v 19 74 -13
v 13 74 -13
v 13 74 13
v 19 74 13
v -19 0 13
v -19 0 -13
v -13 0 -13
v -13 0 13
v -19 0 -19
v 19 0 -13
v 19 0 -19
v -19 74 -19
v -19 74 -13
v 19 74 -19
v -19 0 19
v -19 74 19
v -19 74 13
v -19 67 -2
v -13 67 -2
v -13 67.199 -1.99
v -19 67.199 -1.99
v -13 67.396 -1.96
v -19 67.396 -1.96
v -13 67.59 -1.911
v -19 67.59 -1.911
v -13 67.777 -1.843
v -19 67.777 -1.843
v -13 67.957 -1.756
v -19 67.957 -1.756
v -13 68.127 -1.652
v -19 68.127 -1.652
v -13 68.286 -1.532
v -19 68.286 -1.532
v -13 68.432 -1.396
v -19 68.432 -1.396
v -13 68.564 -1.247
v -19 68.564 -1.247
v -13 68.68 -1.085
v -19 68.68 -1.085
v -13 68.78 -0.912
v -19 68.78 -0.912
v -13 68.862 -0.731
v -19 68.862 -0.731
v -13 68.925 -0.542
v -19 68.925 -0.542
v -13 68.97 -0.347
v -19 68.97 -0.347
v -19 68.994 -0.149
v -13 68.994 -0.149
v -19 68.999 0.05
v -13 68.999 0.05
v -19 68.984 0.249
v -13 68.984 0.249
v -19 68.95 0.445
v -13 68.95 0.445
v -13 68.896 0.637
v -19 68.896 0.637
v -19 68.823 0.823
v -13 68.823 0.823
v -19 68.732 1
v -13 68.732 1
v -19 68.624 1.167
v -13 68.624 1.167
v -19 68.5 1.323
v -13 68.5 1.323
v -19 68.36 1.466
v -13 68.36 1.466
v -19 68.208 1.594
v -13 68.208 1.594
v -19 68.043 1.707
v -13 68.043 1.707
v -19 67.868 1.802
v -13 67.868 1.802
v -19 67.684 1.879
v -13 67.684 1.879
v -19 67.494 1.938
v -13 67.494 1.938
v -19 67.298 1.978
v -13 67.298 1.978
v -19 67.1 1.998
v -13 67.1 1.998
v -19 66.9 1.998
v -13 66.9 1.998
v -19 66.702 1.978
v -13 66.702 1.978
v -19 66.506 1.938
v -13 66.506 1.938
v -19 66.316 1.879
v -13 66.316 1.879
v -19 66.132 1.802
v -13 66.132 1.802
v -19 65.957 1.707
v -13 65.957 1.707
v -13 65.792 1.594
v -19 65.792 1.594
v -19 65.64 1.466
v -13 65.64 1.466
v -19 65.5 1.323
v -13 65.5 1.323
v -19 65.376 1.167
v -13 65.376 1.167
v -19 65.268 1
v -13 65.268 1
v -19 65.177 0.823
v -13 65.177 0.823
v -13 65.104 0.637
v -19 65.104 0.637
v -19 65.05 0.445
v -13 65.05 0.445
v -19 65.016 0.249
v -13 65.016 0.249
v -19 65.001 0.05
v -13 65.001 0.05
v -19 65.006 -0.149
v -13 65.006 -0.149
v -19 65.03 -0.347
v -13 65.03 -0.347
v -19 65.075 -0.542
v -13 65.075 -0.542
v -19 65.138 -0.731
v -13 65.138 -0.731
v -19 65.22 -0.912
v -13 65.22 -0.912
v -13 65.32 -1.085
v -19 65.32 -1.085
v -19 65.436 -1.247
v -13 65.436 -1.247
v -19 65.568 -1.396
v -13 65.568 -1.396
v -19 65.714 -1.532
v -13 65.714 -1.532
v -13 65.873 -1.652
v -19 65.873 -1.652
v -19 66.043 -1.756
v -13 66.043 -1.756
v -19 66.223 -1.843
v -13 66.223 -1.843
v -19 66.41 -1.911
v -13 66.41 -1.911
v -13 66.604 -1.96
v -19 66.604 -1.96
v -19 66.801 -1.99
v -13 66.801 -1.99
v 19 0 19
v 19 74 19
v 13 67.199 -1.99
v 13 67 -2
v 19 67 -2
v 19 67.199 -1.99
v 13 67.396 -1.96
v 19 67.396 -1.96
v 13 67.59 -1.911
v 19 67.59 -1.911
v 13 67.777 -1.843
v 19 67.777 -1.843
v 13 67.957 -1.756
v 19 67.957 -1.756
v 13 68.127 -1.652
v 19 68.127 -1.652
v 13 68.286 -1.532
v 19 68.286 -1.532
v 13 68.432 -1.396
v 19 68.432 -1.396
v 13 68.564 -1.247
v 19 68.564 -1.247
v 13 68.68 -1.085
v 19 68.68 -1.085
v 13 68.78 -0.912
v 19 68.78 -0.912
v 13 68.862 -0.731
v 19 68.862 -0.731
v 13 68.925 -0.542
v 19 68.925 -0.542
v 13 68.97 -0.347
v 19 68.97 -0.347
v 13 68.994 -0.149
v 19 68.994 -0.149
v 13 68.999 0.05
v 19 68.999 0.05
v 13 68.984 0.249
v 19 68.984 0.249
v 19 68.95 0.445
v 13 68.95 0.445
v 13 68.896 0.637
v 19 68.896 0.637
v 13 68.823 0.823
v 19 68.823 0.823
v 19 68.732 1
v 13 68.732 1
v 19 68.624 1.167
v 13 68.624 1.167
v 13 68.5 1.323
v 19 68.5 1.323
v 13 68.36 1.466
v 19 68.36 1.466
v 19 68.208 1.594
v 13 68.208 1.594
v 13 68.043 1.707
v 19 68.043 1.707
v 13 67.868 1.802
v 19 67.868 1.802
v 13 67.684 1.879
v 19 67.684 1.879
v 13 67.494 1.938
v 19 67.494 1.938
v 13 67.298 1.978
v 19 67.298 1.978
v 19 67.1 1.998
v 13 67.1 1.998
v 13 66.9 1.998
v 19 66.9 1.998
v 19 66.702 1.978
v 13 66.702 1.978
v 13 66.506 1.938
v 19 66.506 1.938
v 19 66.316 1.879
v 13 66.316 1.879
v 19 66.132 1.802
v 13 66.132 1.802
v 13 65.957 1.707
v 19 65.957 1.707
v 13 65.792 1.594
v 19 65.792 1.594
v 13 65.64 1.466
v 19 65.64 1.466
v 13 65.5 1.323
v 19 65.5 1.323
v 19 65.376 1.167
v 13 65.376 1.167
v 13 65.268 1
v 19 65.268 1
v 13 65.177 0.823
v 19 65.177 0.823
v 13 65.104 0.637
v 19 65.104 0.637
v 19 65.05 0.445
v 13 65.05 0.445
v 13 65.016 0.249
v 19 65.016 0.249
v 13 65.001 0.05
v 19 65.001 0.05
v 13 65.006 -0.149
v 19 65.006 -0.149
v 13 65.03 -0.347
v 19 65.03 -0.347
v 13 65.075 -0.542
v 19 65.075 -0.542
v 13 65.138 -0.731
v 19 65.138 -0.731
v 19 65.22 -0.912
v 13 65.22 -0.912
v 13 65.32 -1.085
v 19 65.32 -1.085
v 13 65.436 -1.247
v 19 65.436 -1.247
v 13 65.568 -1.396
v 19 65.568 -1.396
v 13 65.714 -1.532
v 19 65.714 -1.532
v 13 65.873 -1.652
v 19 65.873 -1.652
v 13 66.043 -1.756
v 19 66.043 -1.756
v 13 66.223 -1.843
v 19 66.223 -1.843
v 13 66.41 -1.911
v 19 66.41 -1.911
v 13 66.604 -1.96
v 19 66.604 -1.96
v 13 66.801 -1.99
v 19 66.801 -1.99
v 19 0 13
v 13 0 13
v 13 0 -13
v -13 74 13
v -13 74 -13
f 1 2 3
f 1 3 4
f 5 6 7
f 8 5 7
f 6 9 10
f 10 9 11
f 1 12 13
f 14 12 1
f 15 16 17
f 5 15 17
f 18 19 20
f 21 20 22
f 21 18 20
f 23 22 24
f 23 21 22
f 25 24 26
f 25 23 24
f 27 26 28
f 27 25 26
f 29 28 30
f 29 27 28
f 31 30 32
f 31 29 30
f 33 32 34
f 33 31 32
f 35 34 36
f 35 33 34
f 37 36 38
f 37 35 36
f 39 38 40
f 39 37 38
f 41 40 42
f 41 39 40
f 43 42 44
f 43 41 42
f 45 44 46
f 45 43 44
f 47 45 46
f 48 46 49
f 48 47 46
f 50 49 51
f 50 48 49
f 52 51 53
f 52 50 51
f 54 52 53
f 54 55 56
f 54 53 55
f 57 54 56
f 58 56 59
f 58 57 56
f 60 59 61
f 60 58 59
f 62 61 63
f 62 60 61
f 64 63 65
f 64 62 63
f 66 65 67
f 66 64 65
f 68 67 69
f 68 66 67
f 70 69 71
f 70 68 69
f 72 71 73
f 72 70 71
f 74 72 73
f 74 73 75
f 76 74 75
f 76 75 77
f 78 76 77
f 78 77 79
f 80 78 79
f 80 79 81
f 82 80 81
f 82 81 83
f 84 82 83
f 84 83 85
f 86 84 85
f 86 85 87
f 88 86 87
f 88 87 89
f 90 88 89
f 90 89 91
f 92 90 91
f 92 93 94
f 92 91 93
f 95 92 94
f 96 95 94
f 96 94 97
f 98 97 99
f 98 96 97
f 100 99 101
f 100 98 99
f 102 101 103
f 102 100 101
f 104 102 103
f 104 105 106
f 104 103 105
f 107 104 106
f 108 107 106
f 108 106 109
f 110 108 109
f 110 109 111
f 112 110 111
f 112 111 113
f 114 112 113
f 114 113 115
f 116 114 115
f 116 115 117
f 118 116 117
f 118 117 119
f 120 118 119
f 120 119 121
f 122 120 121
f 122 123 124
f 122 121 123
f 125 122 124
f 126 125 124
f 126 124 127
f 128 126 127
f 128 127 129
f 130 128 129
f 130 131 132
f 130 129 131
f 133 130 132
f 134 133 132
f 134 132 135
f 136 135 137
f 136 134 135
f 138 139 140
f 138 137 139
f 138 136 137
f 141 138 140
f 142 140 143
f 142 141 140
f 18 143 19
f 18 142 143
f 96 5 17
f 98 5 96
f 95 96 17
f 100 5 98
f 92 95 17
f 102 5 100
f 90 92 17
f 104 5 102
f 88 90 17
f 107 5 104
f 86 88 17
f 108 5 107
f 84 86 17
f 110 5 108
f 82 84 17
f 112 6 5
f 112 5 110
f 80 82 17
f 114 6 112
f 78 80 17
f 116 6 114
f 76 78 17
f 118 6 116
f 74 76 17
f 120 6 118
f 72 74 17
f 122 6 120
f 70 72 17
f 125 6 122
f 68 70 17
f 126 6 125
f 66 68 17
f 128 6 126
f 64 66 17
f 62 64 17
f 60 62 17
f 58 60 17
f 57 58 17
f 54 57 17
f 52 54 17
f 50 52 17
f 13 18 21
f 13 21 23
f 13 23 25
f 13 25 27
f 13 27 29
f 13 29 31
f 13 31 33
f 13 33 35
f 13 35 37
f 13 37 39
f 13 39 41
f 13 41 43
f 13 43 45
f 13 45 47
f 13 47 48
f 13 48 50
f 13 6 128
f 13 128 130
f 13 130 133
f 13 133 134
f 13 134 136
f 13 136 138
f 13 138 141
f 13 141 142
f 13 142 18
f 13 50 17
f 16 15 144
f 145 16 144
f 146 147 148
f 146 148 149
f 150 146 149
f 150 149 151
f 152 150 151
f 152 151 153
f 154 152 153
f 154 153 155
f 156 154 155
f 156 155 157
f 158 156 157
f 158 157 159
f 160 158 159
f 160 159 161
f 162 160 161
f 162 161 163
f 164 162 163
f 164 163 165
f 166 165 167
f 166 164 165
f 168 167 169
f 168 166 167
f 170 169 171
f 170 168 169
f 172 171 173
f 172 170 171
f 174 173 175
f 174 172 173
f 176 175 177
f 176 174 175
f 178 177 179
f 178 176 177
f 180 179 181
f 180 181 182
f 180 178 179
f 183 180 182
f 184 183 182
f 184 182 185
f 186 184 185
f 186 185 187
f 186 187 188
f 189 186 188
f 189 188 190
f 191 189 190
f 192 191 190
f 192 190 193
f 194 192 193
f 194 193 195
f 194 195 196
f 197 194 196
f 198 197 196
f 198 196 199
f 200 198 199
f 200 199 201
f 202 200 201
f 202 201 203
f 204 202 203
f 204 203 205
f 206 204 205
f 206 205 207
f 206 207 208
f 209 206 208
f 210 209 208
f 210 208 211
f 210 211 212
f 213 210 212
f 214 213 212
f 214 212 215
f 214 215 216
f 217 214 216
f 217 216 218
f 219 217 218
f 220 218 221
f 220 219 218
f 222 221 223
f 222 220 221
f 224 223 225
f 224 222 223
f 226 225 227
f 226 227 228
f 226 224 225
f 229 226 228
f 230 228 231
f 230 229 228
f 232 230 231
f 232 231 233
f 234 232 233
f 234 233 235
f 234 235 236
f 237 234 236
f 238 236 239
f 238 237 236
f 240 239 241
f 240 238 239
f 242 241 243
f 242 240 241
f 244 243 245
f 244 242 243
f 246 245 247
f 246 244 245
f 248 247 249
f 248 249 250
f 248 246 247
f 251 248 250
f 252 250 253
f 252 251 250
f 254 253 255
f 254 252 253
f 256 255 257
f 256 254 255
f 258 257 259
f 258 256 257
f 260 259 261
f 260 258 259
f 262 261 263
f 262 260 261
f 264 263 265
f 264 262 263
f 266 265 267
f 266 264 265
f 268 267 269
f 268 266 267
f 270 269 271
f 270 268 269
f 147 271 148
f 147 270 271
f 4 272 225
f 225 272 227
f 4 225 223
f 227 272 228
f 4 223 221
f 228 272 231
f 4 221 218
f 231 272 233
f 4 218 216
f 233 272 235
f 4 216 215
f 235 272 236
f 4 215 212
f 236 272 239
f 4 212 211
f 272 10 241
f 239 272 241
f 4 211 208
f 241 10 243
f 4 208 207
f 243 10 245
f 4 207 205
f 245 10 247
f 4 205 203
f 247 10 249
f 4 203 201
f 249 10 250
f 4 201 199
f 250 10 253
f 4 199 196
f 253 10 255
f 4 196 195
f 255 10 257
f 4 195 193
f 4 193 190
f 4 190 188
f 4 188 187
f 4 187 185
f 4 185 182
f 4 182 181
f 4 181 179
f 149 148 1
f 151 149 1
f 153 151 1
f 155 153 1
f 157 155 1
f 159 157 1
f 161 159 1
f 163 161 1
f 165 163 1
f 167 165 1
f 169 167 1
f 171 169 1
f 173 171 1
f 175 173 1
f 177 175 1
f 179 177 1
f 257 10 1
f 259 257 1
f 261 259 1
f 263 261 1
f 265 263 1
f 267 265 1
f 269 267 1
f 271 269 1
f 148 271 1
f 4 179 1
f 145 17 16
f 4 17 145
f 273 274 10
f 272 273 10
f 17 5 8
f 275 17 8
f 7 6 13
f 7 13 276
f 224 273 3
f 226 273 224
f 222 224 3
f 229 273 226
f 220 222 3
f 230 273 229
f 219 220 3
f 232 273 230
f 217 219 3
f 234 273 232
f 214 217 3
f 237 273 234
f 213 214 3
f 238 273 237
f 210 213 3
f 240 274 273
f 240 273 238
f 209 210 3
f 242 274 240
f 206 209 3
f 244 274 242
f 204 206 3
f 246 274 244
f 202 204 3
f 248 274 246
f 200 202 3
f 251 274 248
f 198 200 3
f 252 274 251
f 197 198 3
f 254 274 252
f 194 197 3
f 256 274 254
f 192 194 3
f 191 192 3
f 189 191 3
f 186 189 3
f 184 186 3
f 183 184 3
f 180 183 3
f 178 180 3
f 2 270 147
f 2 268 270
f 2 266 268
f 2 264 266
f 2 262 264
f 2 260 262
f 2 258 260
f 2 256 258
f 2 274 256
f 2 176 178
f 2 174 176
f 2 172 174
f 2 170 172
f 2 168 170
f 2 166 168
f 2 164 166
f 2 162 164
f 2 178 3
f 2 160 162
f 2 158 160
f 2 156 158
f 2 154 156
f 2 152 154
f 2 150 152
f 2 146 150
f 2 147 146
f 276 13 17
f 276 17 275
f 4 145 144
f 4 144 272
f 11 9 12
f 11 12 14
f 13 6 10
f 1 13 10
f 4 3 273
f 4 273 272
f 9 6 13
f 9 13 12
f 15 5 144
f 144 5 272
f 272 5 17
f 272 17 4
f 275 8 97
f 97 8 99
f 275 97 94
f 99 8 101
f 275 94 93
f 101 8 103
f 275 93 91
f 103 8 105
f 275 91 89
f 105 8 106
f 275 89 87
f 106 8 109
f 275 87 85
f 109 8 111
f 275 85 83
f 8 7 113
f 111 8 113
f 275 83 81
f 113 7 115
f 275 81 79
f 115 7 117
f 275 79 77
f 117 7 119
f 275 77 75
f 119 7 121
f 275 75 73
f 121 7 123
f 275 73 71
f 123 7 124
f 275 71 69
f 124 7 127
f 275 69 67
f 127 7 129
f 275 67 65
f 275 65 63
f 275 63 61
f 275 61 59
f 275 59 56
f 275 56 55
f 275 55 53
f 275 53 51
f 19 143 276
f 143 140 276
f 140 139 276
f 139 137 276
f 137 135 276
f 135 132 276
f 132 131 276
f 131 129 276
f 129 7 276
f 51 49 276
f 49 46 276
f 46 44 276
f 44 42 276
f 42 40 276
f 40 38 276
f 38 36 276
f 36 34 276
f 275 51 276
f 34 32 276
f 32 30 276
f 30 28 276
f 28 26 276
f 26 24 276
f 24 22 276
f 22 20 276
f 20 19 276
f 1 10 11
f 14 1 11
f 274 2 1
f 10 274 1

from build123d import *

# Parameters (mm, degrees)
ESBO_O1_W                  = 38
ESBO_O1_H                  = 6
RESSALTO_EXTRUS_O1_DEPTH   = 74
RESSALTO_EXTRUS_O1_2_DEPTH = 74
ESBO_O2_W                  = 6
ESBO_O2_H                  = 74
RESSALTO_EXTRUS_O2_DEPTH   = 26
RESSALTO_EXTRUS_O2_2_DEPTH = 26
CORTE_TUBO_START           = -38
ESBO_O3_R                  = 2
CORTE_TUBO_DEPTH           = 38


with BuildPart() as part:
    # Esboço1 → Ressalto-extrusão1 (new body)
    with BuildSketch(Plane(origin=(0, 0, 0), x_dir=(1, 0, 0), z_dir=(0, 1, 0))):
        with Locations((0, -16)):
            Rectangle(ESBO_O1_W, ESBO_O1_H)
    extrude(amount=RESSALTO_EXTRUS_O1_DEPTH)


with BuildPart() as body_2:
    # Esboço1 → Ressalto-extrus_o1 2 (new body)
    with BuildSketch(Plane(origin=(0, 0, 0), x_dir=(1, 0, 0), z_dir=(0, 1, 0))):
        with Locations((0, 16)):
            Rectangle(ESBO_O1_W, ESBO_O1_H)
    extrude(amount=RESSALTO_EXTRUS_O1_2_DEPTH)


with BuildPart() as body_3:
    # Esboço2 → Ressalto-extrusão2 (new body)
    with BuildSketch(Plane.XY.offset(-13)):
        with Locations((16, 37)):
            Rectangle(ESBO_O2_W, ESBO_O2_H)
    extrude(amount=RESSALTO_EXTRUS_O2_DEPTH)


with BuildPart() as body_4:
    # Esboço2 → Ressalto-extrus_o2 2 (new body)
    with BuildSketch(Plane.XY.offset(-13)):
        with Locations((-16, 37)):
            Rectangle(ESBO_O2_W, ESBO_O2_H)
    extrude(amount=RESSALTO_EXTRUS_O2_2_DEPTH)


with BuildPart() as corte_tubo_tool:
    # Esboço3 → Corte_tubo (new body)
    with BuildSketch(Plane(origin=(19, 0, 0), x_dir=(0, 0, -1), z_dir=(1, 0, 0)).offset(CORTE_TUBO_START)):
        with Locations((0, 67)):
            Circle(ESBO_O3_R)
    extrude(amount=CORTE_TUBO_DEPTH)


with BuildPart() as body_3_1:
    add(body_3.part)

    # Corte_tubo: cut by corte_tubo_tool
    add(corte_tubo_tool.part, mode=Mode.SUBTRACT)


with BuildPart() as body_4_1:
    add(body_4.part)

    # Corte_tubo: cut by corte_tubo_tool
    add(corte_tubo_tool.part, mode=Mode.SUBTRACT)


solid = Compound([part.part, body_2.part, body_3_1.part, body_4_1.part])
